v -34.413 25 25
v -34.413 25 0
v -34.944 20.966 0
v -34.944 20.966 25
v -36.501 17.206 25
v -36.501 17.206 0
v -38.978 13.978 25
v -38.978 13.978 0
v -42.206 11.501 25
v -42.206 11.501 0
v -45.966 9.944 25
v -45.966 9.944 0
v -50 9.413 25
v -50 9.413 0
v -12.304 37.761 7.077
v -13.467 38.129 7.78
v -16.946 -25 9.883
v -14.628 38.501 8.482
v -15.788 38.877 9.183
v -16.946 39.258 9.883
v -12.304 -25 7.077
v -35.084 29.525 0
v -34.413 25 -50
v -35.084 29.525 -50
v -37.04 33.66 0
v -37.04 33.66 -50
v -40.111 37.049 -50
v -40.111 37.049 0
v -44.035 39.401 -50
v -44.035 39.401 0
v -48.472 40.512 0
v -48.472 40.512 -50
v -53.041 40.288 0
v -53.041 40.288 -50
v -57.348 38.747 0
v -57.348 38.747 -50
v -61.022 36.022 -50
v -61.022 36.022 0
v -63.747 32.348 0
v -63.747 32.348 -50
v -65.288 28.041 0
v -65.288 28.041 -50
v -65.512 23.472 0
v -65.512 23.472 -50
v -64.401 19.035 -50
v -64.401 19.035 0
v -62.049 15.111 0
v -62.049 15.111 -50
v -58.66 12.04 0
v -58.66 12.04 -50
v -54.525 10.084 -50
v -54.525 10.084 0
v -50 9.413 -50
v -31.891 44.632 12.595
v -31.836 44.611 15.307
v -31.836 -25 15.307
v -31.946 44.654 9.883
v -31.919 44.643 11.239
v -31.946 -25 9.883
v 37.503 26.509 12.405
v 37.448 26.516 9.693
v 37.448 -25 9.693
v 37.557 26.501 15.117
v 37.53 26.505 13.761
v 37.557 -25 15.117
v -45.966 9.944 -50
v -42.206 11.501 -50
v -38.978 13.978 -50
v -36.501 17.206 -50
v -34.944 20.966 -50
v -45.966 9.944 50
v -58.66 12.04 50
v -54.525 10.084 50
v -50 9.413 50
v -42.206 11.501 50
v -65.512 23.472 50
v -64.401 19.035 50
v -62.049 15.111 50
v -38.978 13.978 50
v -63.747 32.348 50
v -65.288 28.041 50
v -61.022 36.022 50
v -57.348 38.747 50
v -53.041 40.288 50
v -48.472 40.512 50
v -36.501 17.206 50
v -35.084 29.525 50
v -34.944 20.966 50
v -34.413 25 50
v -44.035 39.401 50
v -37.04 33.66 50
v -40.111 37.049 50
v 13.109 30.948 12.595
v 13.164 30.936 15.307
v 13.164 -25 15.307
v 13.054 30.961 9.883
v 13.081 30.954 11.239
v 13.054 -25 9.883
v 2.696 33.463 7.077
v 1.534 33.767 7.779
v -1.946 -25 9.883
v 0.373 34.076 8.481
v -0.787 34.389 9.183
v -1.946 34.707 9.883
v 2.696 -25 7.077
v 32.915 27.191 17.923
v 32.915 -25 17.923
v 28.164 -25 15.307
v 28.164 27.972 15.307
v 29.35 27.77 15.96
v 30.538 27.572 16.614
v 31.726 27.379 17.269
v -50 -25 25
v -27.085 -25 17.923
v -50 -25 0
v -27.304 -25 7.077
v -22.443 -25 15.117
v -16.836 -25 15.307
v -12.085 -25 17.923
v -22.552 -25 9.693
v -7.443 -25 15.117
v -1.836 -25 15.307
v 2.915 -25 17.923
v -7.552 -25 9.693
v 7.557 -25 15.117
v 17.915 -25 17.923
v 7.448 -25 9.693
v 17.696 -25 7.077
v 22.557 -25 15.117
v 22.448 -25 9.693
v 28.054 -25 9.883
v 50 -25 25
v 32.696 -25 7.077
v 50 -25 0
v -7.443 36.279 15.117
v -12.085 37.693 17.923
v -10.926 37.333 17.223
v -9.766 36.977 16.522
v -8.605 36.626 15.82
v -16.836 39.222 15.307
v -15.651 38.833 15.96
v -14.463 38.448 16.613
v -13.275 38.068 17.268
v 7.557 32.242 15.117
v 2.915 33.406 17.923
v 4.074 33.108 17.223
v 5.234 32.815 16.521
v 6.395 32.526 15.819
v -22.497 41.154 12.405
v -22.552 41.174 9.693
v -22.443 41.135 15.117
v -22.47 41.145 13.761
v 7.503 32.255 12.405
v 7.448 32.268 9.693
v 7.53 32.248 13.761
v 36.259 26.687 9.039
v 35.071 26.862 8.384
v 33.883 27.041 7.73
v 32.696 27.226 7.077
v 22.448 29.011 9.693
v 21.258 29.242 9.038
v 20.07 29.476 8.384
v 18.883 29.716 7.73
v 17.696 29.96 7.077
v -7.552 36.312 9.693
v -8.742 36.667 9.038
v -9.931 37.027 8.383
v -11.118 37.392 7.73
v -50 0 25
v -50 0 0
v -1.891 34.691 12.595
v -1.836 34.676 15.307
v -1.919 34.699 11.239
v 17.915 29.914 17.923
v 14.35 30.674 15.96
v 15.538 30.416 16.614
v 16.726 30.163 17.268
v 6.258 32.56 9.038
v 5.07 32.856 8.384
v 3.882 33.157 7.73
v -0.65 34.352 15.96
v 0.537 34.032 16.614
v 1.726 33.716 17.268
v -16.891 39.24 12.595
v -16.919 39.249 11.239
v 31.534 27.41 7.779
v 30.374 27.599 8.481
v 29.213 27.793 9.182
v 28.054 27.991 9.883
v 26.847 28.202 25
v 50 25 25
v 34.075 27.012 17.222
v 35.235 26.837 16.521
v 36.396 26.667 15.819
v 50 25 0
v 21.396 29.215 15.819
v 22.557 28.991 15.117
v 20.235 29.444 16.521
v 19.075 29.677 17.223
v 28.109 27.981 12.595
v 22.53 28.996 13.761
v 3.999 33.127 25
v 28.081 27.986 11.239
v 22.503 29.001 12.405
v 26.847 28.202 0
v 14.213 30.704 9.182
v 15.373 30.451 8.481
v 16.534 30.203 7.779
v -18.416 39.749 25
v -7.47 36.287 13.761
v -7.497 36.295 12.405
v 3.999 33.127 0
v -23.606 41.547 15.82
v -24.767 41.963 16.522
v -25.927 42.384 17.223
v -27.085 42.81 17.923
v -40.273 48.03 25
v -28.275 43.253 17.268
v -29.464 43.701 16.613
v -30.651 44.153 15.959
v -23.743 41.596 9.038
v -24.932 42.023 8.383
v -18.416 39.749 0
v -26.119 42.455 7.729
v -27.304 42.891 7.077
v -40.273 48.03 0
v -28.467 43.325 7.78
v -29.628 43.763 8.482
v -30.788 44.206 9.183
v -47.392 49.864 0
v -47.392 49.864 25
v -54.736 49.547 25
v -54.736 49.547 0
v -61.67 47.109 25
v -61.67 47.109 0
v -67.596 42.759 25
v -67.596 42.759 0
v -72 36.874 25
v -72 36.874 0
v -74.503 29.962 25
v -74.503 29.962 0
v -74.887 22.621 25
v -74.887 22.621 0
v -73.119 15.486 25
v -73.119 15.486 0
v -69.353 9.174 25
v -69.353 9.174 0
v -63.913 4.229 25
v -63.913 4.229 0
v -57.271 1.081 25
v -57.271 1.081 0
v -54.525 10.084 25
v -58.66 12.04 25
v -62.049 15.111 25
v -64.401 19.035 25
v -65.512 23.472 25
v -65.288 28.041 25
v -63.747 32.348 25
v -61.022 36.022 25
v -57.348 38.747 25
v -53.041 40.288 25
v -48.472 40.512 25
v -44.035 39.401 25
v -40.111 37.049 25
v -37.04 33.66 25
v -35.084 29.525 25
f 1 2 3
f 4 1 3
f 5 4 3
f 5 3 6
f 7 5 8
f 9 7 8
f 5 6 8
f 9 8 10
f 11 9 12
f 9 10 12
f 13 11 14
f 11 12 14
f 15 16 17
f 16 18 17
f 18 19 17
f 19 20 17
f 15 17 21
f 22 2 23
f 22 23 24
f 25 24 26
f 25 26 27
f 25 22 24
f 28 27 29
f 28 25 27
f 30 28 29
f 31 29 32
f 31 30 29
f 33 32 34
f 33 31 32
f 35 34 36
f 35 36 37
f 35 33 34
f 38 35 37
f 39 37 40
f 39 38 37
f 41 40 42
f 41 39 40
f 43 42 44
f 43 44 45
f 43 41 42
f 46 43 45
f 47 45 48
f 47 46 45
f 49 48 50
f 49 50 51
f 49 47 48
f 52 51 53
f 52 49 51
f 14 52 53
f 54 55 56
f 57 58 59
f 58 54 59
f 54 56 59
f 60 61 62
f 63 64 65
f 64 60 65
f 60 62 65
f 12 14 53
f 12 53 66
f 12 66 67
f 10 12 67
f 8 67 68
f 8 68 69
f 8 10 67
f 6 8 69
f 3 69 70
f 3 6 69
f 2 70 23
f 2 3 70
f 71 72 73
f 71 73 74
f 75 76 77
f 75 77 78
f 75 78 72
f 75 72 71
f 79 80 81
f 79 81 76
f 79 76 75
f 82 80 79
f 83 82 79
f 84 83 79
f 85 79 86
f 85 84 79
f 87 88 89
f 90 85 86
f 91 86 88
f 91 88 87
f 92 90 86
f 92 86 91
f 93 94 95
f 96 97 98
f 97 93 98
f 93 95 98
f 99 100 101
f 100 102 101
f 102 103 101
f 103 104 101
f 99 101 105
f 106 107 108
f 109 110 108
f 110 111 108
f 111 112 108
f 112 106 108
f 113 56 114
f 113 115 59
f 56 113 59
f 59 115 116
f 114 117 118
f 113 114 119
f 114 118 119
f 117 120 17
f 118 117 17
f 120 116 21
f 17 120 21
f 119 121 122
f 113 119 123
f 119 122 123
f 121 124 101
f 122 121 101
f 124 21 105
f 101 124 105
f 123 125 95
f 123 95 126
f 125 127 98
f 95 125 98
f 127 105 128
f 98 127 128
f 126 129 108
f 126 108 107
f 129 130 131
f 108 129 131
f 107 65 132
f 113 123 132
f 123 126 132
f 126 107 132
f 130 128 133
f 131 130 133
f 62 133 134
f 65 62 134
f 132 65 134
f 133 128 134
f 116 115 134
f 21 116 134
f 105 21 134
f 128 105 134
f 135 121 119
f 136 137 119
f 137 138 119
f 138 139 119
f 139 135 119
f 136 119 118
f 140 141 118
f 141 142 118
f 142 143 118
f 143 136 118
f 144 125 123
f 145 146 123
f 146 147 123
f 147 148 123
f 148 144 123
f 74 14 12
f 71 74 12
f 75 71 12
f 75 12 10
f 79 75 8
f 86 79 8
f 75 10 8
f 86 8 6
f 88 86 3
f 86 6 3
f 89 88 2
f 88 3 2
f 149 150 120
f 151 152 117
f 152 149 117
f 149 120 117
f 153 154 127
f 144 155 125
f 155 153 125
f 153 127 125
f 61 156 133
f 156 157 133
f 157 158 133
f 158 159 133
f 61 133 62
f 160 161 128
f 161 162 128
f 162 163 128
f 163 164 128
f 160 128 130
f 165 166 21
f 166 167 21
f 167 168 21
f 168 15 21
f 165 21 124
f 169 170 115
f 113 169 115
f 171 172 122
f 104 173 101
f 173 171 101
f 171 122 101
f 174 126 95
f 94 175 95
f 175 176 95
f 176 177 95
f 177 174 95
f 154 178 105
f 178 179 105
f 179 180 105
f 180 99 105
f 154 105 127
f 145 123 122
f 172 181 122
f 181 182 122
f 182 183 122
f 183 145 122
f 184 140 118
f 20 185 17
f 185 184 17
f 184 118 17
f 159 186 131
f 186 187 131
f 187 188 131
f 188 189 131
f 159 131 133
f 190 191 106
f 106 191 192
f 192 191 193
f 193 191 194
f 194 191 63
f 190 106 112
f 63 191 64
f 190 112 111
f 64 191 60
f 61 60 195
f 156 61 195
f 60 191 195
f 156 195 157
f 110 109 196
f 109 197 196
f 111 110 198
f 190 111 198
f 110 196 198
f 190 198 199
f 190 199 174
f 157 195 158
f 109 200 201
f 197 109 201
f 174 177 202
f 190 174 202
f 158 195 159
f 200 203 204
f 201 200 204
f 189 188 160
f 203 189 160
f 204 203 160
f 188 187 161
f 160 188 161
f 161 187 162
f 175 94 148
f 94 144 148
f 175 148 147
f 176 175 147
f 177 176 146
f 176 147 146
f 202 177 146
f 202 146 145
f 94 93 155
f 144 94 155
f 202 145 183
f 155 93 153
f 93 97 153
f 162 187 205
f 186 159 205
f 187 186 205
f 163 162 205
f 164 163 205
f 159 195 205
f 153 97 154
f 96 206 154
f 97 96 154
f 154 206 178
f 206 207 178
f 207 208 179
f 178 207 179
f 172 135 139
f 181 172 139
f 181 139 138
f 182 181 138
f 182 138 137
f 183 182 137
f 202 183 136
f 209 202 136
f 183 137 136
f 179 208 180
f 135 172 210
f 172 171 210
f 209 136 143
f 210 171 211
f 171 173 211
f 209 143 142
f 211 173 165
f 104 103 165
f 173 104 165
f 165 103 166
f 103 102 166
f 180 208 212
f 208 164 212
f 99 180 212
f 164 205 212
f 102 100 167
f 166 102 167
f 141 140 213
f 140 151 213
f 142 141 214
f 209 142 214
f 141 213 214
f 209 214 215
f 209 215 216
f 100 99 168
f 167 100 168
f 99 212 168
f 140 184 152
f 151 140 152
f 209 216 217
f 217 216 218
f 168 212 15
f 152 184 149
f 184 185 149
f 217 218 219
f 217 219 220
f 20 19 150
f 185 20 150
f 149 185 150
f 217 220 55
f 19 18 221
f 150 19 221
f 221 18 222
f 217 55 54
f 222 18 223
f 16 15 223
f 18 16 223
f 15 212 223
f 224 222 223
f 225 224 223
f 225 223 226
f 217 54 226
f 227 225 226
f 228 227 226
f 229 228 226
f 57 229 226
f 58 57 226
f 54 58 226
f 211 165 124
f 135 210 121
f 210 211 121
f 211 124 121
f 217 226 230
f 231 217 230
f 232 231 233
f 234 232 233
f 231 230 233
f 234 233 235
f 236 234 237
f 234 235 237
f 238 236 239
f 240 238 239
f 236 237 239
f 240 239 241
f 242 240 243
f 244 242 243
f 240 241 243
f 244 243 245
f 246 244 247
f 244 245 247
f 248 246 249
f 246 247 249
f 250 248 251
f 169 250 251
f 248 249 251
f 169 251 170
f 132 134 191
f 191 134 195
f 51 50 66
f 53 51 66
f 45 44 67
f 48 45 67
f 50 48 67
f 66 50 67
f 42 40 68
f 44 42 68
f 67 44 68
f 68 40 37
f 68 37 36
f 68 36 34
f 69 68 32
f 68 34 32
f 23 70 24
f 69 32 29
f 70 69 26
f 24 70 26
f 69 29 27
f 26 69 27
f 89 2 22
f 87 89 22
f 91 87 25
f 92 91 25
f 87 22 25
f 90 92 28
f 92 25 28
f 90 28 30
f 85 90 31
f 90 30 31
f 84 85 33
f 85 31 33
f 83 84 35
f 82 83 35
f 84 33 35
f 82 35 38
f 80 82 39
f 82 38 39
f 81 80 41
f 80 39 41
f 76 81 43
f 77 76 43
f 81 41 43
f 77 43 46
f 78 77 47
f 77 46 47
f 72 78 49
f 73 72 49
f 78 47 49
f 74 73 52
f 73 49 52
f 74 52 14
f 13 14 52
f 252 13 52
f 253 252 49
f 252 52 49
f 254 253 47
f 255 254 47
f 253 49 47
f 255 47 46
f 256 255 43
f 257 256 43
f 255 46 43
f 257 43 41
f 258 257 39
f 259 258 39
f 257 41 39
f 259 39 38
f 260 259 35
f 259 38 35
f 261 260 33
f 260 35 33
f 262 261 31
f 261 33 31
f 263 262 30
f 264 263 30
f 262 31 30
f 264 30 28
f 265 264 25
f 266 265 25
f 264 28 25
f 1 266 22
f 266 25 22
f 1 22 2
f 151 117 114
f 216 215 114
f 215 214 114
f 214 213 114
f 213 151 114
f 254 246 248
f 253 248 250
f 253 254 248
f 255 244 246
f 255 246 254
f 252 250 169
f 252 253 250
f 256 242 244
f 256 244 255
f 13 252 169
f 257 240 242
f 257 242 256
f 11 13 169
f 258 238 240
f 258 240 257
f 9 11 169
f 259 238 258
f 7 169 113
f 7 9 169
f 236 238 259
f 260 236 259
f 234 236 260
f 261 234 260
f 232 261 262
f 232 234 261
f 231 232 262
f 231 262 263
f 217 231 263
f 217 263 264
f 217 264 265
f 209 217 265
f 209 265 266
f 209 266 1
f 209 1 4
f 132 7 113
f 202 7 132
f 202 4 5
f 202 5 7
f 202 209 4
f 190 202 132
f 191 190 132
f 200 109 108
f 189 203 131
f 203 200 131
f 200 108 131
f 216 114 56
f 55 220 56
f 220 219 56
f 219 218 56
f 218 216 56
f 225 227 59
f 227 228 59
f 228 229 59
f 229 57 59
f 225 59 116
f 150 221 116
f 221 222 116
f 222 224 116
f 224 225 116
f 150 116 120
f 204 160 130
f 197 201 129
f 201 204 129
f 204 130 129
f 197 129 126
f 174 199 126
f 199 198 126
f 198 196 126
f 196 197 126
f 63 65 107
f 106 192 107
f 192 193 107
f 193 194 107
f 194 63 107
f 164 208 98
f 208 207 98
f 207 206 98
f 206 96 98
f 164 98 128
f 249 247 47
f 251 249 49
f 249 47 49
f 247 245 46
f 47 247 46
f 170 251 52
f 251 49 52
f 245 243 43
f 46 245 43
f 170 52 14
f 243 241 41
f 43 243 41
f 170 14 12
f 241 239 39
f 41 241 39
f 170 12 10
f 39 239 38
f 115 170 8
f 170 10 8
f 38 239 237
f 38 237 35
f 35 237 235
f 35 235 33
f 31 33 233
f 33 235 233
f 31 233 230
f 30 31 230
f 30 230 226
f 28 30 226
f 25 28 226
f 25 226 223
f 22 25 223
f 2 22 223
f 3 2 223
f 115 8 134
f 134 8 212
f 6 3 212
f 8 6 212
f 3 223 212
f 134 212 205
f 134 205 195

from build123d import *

# Parameters (mm, degrees)
F1_DEPTH = 25
F2_DEPTH = 50
F4_DEPTH = 100


with BuildPart() as f1:
    # F0 (on Top) → F1 (new body)
    with BuildSketch(Plane.XY):
        with BuildLine():
            ThreePointArc((-50, 9.4125951482), (-61.0219596718, 36.0219596718), (-34.4125951482, 25))
            Line((-34.4125951482, 25), (-25, 25))
            ThreePointArc((-25, 25), (-29.1653033812, 38.8172145096), (-40.2732333443, 48.0301977939))
            ThreePointArc((-40.2732333443, 48.0301977939), (-74.5026013399, 29.9621091863), (-50, 0))
            Line((-50, 0), (-50, 9.4125951482))
        make_face()
        with BuildLine():
            Line((-25, 25), (-34.4125951482, 25))
            ThreePointArc((-34.4125951482, 25), (-38.9780403282, 13.9780403282), (-50, 9.4125951482))
            Line((-50, 9.4125951482), (-50, 0))
            ThreePointArc((-50, 0), (-32.3223304703, 7.3223304703), (-25, 25))
        make_face()
        with BuildLine():
            ThreePointArc((-40.2732333443, 48.0301977939), (-29.1653033812, 38.8172145096), (-25, 25))
            Line((-25, 25), (50, 25))
            ThreePointArc((50, 25), (3.9990883715, 33.1272556411), (-40.2732333443, 48.0301977939))
        make_face()
        with BuildLine():
            Line((50, 25), (-25, 25))
            ThreePointArc((-25, 25), (-32.3223304703, 7.3223304703), (-50, 0))
            Line((-50, 0), (-50, -25))
            Line((-50, -25), (50, -25))
            Line((50, -25), (50, 25))
        make_face()
    extrude(amount=F1_DEPTH)

    # F3 (on face) → F4 (cut)
    with BuildSketch(Plane.XZ.offset(25)):
        Polygon((-27.3039182642, 7.0765079837), (-22.5522005936, 9.6932755877), (-22.4425289792, 15.1167676039), (-27.0845750353, 17.9234920163), (-31.8362927058, 15.3067244123), (-31.9459643203, 9.8832323961), align=None)
        Polygon((-7.5522005936, 9.6932755877), (-7.4425289792, 15.1167676039), (-12.0845750353, 17.9234920163), (-16.8362927058, 15.3067244123), (-16.9459643203, 9.8832323961), (-12.3039182642, 7.0765079837), align=None)
        Polygon((7.4477994064, 9.6932755877), (7.5574710208, 15.1167676039), (2.9154249647, 17.9234920163), (-1.8362927058, 15.3067244123), (-1.9459643203, 9.8832323961), (2.6960817358, 7.0765079837), align=None)
        Polygon((22.4477994064, 9.6932755877), (22.5574710208, 15.1167676039), (17.9154249647, 17.9234920163), (13.1637072942, 15.3067244123), (13.0540356797, 9.8832323961), (17.6960817358, 7.0765079837), align=None)
        Polygon((37.4477994064, 9.6932755877), (37.5574710208, 15.1167676039), (32.9154249647, 17.9234920163), (28.1637072942, 15.3067244123), (28.0540356797, 9.8832323961), (32.6960817358, 7.0765079837), align=None)
    extrude(amount=-F4_DEPTH, mode=Mode.SUBTRACT)


with BuildPart() as f2:
    # F0 (on Top) → F2 (new body, symmetric)
    with BuildSketch(Plane.XY):
        with BuildLine():
            Line((-50, 9.4125951482), (-50, 25))
            Line((-50, 25), (-34.4125951482, 25))
            ThreePointArc((-34.4125951482, 25), (-61.0219596718, 36.0219596718), (-50, 9.4125951482))
        make_face()
        with BuildLine():
            Line((-34.4125951482, 25), (-50, 25))
            Line((-50, 25), (-50, 9.4125951482))
            ThreePointArc((-50, 9.4125951482), (-38.9780403282, 13.9780403282), (-34.4125951482, 25))
        make_face()
    extrude(amount=F2_DEPTH, both=True)


solid = Compound([f1.part, f2.part])
